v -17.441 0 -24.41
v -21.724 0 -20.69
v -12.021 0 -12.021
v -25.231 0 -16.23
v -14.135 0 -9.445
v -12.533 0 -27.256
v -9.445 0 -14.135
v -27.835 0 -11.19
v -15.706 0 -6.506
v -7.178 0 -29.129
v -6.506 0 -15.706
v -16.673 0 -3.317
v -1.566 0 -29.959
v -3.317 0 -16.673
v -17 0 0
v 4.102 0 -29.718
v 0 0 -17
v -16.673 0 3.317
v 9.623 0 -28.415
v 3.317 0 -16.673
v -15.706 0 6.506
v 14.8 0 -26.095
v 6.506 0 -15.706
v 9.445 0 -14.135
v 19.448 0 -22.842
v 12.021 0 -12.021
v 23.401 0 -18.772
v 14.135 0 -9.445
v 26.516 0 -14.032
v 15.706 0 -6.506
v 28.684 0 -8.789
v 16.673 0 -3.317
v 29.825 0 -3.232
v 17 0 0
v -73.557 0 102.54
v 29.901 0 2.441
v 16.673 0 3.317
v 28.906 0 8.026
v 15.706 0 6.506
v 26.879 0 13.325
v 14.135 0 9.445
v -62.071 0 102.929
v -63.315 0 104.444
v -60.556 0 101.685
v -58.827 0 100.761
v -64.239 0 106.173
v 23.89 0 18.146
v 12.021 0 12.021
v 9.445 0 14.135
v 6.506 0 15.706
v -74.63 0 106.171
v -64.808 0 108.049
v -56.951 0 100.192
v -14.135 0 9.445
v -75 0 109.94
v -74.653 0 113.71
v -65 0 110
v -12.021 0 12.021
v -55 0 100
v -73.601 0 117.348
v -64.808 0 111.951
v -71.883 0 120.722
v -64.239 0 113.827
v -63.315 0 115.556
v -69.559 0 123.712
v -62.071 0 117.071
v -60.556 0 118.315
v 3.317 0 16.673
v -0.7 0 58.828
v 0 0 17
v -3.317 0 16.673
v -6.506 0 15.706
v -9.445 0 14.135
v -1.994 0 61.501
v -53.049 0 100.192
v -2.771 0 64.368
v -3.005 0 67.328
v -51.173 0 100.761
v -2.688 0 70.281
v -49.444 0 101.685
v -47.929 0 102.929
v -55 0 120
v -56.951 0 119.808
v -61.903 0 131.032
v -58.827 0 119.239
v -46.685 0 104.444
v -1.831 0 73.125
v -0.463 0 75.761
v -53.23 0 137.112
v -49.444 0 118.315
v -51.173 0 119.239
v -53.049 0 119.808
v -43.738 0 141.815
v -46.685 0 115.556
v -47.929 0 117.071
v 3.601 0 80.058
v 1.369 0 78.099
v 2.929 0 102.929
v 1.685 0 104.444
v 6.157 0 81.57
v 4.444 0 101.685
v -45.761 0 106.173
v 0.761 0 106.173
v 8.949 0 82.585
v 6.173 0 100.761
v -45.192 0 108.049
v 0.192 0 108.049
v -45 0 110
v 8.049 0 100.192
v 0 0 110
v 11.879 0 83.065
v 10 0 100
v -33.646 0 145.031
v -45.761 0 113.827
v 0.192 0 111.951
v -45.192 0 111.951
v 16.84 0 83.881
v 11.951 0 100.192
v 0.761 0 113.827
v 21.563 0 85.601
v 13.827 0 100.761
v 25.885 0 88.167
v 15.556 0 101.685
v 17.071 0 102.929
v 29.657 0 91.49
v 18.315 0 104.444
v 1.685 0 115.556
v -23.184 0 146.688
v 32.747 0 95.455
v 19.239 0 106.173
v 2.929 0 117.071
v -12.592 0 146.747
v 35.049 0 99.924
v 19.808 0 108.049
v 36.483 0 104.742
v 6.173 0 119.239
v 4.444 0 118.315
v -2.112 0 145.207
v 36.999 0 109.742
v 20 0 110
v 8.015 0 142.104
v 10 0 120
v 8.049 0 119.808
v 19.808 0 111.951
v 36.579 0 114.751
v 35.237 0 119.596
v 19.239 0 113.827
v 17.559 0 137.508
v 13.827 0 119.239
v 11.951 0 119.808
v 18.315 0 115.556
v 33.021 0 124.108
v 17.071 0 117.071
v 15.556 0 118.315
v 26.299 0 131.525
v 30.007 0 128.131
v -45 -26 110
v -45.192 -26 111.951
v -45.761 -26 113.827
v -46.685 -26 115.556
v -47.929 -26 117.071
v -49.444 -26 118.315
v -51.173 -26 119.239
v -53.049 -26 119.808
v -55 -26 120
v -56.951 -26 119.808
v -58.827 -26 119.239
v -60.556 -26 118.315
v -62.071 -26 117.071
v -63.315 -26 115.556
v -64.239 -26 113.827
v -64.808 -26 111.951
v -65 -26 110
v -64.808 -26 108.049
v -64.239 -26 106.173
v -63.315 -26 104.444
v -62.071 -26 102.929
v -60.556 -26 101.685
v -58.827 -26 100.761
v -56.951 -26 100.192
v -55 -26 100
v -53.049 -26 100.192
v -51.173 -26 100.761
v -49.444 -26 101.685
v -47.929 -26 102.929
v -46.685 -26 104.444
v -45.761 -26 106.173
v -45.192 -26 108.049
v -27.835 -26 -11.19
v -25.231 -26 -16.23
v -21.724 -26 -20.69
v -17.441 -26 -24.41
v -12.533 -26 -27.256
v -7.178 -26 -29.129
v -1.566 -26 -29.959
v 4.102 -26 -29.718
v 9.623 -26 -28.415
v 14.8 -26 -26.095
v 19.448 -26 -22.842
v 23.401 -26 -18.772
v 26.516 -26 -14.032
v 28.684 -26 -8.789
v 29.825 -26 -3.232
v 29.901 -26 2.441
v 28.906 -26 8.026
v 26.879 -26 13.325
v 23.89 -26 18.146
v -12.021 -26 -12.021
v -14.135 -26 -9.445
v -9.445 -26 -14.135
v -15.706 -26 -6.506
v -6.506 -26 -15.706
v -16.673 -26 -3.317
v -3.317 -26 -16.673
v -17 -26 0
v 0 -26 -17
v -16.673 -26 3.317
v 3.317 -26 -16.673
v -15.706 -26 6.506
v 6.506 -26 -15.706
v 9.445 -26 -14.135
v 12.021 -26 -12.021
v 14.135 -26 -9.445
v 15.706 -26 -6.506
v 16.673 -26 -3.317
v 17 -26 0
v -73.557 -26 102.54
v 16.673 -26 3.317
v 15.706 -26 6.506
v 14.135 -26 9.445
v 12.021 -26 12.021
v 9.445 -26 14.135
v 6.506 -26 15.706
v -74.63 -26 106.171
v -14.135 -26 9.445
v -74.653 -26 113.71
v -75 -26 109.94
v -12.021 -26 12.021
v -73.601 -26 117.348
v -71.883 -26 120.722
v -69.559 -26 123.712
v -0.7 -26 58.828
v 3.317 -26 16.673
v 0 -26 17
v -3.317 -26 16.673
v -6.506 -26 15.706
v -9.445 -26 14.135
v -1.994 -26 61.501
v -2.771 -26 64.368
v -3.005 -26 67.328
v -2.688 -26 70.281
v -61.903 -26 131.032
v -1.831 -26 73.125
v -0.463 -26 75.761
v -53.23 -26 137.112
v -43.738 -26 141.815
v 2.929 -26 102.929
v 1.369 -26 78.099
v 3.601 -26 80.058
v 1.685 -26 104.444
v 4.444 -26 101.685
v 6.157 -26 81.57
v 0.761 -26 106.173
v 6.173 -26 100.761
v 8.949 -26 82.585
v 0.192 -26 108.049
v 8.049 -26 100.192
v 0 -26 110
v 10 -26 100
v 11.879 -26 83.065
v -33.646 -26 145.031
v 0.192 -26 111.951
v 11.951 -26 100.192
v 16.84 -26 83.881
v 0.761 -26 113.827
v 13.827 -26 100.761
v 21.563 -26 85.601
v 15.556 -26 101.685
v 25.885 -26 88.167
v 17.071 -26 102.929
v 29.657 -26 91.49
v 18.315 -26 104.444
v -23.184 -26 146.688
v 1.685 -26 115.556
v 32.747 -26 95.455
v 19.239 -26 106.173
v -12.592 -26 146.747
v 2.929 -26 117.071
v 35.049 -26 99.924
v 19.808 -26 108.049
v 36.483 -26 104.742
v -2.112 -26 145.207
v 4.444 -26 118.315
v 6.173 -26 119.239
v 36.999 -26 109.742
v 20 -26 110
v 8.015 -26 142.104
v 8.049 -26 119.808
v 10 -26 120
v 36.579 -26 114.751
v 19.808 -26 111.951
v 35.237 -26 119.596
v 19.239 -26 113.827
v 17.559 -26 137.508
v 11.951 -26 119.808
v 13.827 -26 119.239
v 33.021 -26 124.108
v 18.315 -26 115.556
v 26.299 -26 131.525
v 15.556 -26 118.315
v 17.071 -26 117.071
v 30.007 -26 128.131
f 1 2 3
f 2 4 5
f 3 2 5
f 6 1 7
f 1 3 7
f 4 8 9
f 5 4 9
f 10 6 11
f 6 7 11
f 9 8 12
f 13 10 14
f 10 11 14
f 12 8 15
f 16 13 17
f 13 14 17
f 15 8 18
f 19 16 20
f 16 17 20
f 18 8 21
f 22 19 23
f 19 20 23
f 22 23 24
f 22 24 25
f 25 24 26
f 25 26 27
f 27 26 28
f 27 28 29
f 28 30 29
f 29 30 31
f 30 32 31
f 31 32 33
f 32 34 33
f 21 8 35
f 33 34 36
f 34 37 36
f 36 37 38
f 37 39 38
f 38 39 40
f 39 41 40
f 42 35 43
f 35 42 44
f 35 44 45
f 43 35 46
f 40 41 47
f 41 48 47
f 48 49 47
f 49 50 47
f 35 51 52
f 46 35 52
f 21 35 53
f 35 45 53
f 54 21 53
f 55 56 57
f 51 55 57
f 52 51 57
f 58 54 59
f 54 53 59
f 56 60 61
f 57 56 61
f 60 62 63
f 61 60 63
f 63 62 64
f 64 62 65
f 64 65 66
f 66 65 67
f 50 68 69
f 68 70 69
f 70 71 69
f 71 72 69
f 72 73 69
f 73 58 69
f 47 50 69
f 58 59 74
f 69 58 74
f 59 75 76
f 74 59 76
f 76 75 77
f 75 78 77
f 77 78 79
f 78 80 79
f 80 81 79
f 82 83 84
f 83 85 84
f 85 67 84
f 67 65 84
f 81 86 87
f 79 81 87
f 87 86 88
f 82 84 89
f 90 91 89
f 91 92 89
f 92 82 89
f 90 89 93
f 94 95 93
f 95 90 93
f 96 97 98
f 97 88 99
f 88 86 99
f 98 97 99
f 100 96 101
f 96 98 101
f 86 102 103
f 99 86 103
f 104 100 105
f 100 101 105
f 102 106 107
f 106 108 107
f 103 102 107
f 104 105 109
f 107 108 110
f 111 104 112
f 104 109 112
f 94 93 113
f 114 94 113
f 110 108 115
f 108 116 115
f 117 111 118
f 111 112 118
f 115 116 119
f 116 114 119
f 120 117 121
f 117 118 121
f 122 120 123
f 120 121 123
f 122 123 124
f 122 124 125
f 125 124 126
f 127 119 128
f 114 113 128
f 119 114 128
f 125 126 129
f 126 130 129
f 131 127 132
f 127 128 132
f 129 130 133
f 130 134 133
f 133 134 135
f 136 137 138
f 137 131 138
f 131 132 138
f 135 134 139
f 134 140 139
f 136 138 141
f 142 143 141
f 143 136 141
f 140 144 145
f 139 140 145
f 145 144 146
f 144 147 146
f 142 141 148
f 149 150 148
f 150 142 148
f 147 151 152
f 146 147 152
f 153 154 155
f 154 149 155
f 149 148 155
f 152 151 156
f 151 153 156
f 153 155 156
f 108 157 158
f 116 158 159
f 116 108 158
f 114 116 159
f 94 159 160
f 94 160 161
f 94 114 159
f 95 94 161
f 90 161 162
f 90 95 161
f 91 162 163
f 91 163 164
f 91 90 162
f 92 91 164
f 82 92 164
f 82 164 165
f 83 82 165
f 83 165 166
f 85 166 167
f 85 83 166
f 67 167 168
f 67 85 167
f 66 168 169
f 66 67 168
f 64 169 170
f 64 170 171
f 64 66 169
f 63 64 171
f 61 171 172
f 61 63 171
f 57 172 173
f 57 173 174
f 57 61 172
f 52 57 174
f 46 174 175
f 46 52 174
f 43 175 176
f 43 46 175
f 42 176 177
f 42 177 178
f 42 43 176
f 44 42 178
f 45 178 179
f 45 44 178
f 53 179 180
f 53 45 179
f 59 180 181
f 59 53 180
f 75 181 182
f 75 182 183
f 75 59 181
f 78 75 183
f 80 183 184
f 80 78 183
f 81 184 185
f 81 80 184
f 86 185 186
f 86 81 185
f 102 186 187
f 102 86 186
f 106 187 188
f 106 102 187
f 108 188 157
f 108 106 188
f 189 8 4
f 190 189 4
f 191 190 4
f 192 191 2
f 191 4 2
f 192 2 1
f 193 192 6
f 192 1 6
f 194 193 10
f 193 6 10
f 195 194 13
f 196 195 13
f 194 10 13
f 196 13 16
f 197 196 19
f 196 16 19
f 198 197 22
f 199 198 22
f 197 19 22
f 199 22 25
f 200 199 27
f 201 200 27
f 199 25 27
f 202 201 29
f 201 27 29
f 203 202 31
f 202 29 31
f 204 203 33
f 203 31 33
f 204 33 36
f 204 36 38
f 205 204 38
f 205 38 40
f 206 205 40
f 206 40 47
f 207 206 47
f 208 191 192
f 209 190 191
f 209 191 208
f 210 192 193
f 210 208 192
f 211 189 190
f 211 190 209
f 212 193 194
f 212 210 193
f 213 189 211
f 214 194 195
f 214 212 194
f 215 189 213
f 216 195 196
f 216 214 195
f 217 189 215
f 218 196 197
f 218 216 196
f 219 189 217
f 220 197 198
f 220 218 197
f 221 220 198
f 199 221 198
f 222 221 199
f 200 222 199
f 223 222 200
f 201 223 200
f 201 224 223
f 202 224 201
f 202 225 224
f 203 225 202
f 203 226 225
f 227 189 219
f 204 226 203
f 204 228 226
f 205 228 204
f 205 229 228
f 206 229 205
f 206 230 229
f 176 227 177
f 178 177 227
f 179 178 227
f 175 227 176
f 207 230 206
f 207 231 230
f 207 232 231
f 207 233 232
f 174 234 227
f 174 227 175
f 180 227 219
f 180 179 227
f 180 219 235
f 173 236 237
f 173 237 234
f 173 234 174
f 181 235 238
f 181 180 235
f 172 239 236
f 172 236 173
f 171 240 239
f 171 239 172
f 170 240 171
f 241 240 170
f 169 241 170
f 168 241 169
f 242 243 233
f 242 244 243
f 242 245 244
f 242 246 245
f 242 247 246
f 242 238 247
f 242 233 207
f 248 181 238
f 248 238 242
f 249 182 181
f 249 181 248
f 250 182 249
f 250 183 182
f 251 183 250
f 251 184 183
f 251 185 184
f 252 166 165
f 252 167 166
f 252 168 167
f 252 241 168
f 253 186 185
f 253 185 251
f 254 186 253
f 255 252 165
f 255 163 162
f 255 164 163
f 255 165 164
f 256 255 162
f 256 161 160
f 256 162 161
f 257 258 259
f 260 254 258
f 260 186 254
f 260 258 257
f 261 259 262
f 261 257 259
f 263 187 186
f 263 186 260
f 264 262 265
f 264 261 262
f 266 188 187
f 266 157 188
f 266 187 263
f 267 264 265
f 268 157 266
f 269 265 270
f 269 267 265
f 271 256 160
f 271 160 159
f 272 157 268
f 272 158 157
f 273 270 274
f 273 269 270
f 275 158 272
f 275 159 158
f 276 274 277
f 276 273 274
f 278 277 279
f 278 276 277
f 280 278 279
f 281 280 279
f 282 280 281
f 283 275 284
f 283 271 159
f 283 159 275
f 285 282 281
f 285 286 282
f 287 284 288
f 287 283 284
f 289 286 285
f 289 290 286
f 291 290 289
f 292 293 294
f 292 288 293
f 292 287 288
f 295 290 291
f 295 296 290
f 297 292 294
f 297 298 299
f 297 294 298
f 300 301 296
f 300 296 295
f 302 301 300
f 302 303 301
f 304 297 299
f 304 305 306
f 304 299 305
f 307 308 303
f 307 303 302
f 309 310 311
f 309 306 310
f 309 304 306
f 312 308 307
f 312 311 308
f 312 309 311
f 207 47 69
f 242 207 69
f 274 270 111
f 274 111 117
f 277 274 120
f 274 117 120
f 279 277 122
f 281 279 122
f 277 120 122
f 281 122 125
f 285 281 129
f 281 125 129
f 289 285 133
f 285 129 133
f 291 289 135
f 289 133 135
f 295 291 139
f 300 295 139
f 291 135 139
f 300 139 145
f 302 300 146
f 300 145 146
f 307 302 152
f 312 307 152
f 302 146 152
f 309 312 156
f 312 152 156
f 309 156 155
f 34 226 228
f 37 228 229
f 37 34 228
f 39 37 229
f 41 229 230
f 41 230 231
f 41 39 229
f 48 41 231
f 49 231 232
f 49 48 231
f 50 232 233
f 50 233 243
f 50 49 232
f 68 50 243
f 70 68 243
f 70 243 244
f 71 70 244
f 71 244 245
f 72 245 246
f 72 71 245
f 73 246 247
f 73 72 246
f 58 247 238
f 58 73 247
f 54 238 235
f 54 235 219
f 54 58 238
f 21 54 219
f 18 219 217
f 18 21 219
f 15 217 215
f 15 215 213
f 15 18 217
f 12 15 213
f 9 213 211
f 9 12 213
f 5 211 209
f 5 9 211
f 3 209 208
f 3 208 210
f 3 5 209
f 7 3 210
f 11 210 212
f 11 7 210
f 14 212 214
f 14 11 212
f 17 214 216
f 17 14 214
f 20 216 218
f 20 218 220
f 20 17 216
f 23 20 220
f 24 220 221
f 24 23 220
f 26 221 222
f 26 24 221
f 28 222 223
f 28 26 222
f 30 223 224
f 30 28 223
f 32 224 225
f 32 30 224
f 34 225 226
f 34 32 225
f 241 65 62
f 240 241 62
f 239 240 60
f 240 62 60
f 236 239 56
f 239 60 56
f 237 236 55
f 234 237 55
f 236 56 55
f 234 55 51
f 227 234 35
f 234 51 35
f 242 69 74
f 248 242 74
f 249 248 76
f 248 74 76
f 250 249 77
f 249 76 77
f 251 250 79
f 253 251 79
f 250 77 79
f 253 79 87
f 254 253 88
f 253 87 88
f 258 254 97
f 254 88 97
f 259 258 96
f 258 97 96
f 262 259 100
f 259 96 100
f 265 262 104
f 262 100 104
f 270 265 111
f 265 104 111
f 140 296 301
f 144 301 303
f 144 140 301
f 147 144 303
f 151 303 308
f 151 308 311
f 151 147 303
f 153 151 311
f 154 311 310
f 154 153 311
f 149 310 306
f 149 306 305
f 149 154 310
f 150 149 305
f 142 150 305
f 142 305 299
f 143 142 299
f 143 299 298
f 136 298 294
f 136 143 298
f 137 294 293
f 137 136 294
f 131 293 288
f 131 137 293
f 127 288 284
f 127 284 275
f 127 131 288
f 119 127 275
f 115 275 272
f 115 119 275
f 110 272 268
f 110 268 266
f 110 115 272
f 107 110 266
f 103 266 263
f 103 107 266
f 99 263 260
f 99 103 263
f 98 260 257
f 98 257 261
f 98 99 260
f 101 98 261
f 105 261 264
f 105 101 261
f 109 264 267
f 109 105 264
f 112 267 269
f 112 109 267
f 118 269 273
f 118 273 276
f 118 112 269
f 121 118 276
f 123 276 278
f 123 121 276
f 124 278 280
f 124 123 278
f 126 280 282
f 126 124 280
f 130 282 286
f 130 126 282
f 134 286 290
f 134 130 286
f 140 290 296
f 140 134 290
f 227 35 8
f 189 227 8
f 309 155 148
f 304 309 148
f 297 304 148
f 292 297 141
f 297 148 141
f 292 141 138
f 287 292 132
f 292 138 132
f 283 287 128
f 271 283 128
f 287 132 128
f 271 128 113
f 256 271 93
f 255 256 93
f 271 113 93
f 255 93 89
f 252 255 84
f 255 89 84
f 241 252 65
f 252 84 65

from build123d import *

# Parameters (mm, degrees)
F0_R     = 17
F0_R_2   = 10
F1_DEPTH = 26


with BuildPart() as f1:
    # F0 (on Front) → F1 (new body)
    with BuildSketch(Plane.XZ):
        with BuildLine():
            Line((-73.556583, 102.53989), (-27.834874, -11.190164))
            ThreePointArc((-27.834874, -11.190164), (14.80033, -26.095023), (23.88951, 18.146385))
            Line((23.88951, 18.146385), (-0.699871, 58.827717))
            Line((-0.699871, 58.827717), (-37.883752, 120.345727))
            ThreePointArc((-37.883752, 120.345727), (-52.886286, 129.887992), (-69.559346, 123.712237))
            ThreePointArc((-69.559346, 123.712237), (-74.652818, 113.710357), (-73.556583, 102.53989))
        make_face()
        Circle(F0_R, mode=Mode.SUBTRACT)
        with Locations((-55, 110)):
            Circle(F0_R_2, mode=Mode.SUBTRACT)
        with BuildLine():
            Line((-37.883752, 120.345727), (-0.699871, 58.827717))
            ThreePointArc((-0.699871, 58.827717), (-1.208181, 74.474703), (11.879405, 83.06549))
            ThreePointArc((11.879405, 83.06549), (35.878556, 102.299329), (26.299489, 131.525024))
            ThreePointArc((26.299489, 131.525024), (-23.184125, 146.687816), (-69.559346, 123.712237))
            ThreePointArc((-69.559346, 123.712237), (-52.886286, 129.887992), (-37.883752, 120.345727))
        make_face()
        with Locations((10, 110)):
            Circle(F0_R_2, mode=Mode.SUBTRACT)
    extrude(amount=F1_DEPTH)


solid = f1.part
